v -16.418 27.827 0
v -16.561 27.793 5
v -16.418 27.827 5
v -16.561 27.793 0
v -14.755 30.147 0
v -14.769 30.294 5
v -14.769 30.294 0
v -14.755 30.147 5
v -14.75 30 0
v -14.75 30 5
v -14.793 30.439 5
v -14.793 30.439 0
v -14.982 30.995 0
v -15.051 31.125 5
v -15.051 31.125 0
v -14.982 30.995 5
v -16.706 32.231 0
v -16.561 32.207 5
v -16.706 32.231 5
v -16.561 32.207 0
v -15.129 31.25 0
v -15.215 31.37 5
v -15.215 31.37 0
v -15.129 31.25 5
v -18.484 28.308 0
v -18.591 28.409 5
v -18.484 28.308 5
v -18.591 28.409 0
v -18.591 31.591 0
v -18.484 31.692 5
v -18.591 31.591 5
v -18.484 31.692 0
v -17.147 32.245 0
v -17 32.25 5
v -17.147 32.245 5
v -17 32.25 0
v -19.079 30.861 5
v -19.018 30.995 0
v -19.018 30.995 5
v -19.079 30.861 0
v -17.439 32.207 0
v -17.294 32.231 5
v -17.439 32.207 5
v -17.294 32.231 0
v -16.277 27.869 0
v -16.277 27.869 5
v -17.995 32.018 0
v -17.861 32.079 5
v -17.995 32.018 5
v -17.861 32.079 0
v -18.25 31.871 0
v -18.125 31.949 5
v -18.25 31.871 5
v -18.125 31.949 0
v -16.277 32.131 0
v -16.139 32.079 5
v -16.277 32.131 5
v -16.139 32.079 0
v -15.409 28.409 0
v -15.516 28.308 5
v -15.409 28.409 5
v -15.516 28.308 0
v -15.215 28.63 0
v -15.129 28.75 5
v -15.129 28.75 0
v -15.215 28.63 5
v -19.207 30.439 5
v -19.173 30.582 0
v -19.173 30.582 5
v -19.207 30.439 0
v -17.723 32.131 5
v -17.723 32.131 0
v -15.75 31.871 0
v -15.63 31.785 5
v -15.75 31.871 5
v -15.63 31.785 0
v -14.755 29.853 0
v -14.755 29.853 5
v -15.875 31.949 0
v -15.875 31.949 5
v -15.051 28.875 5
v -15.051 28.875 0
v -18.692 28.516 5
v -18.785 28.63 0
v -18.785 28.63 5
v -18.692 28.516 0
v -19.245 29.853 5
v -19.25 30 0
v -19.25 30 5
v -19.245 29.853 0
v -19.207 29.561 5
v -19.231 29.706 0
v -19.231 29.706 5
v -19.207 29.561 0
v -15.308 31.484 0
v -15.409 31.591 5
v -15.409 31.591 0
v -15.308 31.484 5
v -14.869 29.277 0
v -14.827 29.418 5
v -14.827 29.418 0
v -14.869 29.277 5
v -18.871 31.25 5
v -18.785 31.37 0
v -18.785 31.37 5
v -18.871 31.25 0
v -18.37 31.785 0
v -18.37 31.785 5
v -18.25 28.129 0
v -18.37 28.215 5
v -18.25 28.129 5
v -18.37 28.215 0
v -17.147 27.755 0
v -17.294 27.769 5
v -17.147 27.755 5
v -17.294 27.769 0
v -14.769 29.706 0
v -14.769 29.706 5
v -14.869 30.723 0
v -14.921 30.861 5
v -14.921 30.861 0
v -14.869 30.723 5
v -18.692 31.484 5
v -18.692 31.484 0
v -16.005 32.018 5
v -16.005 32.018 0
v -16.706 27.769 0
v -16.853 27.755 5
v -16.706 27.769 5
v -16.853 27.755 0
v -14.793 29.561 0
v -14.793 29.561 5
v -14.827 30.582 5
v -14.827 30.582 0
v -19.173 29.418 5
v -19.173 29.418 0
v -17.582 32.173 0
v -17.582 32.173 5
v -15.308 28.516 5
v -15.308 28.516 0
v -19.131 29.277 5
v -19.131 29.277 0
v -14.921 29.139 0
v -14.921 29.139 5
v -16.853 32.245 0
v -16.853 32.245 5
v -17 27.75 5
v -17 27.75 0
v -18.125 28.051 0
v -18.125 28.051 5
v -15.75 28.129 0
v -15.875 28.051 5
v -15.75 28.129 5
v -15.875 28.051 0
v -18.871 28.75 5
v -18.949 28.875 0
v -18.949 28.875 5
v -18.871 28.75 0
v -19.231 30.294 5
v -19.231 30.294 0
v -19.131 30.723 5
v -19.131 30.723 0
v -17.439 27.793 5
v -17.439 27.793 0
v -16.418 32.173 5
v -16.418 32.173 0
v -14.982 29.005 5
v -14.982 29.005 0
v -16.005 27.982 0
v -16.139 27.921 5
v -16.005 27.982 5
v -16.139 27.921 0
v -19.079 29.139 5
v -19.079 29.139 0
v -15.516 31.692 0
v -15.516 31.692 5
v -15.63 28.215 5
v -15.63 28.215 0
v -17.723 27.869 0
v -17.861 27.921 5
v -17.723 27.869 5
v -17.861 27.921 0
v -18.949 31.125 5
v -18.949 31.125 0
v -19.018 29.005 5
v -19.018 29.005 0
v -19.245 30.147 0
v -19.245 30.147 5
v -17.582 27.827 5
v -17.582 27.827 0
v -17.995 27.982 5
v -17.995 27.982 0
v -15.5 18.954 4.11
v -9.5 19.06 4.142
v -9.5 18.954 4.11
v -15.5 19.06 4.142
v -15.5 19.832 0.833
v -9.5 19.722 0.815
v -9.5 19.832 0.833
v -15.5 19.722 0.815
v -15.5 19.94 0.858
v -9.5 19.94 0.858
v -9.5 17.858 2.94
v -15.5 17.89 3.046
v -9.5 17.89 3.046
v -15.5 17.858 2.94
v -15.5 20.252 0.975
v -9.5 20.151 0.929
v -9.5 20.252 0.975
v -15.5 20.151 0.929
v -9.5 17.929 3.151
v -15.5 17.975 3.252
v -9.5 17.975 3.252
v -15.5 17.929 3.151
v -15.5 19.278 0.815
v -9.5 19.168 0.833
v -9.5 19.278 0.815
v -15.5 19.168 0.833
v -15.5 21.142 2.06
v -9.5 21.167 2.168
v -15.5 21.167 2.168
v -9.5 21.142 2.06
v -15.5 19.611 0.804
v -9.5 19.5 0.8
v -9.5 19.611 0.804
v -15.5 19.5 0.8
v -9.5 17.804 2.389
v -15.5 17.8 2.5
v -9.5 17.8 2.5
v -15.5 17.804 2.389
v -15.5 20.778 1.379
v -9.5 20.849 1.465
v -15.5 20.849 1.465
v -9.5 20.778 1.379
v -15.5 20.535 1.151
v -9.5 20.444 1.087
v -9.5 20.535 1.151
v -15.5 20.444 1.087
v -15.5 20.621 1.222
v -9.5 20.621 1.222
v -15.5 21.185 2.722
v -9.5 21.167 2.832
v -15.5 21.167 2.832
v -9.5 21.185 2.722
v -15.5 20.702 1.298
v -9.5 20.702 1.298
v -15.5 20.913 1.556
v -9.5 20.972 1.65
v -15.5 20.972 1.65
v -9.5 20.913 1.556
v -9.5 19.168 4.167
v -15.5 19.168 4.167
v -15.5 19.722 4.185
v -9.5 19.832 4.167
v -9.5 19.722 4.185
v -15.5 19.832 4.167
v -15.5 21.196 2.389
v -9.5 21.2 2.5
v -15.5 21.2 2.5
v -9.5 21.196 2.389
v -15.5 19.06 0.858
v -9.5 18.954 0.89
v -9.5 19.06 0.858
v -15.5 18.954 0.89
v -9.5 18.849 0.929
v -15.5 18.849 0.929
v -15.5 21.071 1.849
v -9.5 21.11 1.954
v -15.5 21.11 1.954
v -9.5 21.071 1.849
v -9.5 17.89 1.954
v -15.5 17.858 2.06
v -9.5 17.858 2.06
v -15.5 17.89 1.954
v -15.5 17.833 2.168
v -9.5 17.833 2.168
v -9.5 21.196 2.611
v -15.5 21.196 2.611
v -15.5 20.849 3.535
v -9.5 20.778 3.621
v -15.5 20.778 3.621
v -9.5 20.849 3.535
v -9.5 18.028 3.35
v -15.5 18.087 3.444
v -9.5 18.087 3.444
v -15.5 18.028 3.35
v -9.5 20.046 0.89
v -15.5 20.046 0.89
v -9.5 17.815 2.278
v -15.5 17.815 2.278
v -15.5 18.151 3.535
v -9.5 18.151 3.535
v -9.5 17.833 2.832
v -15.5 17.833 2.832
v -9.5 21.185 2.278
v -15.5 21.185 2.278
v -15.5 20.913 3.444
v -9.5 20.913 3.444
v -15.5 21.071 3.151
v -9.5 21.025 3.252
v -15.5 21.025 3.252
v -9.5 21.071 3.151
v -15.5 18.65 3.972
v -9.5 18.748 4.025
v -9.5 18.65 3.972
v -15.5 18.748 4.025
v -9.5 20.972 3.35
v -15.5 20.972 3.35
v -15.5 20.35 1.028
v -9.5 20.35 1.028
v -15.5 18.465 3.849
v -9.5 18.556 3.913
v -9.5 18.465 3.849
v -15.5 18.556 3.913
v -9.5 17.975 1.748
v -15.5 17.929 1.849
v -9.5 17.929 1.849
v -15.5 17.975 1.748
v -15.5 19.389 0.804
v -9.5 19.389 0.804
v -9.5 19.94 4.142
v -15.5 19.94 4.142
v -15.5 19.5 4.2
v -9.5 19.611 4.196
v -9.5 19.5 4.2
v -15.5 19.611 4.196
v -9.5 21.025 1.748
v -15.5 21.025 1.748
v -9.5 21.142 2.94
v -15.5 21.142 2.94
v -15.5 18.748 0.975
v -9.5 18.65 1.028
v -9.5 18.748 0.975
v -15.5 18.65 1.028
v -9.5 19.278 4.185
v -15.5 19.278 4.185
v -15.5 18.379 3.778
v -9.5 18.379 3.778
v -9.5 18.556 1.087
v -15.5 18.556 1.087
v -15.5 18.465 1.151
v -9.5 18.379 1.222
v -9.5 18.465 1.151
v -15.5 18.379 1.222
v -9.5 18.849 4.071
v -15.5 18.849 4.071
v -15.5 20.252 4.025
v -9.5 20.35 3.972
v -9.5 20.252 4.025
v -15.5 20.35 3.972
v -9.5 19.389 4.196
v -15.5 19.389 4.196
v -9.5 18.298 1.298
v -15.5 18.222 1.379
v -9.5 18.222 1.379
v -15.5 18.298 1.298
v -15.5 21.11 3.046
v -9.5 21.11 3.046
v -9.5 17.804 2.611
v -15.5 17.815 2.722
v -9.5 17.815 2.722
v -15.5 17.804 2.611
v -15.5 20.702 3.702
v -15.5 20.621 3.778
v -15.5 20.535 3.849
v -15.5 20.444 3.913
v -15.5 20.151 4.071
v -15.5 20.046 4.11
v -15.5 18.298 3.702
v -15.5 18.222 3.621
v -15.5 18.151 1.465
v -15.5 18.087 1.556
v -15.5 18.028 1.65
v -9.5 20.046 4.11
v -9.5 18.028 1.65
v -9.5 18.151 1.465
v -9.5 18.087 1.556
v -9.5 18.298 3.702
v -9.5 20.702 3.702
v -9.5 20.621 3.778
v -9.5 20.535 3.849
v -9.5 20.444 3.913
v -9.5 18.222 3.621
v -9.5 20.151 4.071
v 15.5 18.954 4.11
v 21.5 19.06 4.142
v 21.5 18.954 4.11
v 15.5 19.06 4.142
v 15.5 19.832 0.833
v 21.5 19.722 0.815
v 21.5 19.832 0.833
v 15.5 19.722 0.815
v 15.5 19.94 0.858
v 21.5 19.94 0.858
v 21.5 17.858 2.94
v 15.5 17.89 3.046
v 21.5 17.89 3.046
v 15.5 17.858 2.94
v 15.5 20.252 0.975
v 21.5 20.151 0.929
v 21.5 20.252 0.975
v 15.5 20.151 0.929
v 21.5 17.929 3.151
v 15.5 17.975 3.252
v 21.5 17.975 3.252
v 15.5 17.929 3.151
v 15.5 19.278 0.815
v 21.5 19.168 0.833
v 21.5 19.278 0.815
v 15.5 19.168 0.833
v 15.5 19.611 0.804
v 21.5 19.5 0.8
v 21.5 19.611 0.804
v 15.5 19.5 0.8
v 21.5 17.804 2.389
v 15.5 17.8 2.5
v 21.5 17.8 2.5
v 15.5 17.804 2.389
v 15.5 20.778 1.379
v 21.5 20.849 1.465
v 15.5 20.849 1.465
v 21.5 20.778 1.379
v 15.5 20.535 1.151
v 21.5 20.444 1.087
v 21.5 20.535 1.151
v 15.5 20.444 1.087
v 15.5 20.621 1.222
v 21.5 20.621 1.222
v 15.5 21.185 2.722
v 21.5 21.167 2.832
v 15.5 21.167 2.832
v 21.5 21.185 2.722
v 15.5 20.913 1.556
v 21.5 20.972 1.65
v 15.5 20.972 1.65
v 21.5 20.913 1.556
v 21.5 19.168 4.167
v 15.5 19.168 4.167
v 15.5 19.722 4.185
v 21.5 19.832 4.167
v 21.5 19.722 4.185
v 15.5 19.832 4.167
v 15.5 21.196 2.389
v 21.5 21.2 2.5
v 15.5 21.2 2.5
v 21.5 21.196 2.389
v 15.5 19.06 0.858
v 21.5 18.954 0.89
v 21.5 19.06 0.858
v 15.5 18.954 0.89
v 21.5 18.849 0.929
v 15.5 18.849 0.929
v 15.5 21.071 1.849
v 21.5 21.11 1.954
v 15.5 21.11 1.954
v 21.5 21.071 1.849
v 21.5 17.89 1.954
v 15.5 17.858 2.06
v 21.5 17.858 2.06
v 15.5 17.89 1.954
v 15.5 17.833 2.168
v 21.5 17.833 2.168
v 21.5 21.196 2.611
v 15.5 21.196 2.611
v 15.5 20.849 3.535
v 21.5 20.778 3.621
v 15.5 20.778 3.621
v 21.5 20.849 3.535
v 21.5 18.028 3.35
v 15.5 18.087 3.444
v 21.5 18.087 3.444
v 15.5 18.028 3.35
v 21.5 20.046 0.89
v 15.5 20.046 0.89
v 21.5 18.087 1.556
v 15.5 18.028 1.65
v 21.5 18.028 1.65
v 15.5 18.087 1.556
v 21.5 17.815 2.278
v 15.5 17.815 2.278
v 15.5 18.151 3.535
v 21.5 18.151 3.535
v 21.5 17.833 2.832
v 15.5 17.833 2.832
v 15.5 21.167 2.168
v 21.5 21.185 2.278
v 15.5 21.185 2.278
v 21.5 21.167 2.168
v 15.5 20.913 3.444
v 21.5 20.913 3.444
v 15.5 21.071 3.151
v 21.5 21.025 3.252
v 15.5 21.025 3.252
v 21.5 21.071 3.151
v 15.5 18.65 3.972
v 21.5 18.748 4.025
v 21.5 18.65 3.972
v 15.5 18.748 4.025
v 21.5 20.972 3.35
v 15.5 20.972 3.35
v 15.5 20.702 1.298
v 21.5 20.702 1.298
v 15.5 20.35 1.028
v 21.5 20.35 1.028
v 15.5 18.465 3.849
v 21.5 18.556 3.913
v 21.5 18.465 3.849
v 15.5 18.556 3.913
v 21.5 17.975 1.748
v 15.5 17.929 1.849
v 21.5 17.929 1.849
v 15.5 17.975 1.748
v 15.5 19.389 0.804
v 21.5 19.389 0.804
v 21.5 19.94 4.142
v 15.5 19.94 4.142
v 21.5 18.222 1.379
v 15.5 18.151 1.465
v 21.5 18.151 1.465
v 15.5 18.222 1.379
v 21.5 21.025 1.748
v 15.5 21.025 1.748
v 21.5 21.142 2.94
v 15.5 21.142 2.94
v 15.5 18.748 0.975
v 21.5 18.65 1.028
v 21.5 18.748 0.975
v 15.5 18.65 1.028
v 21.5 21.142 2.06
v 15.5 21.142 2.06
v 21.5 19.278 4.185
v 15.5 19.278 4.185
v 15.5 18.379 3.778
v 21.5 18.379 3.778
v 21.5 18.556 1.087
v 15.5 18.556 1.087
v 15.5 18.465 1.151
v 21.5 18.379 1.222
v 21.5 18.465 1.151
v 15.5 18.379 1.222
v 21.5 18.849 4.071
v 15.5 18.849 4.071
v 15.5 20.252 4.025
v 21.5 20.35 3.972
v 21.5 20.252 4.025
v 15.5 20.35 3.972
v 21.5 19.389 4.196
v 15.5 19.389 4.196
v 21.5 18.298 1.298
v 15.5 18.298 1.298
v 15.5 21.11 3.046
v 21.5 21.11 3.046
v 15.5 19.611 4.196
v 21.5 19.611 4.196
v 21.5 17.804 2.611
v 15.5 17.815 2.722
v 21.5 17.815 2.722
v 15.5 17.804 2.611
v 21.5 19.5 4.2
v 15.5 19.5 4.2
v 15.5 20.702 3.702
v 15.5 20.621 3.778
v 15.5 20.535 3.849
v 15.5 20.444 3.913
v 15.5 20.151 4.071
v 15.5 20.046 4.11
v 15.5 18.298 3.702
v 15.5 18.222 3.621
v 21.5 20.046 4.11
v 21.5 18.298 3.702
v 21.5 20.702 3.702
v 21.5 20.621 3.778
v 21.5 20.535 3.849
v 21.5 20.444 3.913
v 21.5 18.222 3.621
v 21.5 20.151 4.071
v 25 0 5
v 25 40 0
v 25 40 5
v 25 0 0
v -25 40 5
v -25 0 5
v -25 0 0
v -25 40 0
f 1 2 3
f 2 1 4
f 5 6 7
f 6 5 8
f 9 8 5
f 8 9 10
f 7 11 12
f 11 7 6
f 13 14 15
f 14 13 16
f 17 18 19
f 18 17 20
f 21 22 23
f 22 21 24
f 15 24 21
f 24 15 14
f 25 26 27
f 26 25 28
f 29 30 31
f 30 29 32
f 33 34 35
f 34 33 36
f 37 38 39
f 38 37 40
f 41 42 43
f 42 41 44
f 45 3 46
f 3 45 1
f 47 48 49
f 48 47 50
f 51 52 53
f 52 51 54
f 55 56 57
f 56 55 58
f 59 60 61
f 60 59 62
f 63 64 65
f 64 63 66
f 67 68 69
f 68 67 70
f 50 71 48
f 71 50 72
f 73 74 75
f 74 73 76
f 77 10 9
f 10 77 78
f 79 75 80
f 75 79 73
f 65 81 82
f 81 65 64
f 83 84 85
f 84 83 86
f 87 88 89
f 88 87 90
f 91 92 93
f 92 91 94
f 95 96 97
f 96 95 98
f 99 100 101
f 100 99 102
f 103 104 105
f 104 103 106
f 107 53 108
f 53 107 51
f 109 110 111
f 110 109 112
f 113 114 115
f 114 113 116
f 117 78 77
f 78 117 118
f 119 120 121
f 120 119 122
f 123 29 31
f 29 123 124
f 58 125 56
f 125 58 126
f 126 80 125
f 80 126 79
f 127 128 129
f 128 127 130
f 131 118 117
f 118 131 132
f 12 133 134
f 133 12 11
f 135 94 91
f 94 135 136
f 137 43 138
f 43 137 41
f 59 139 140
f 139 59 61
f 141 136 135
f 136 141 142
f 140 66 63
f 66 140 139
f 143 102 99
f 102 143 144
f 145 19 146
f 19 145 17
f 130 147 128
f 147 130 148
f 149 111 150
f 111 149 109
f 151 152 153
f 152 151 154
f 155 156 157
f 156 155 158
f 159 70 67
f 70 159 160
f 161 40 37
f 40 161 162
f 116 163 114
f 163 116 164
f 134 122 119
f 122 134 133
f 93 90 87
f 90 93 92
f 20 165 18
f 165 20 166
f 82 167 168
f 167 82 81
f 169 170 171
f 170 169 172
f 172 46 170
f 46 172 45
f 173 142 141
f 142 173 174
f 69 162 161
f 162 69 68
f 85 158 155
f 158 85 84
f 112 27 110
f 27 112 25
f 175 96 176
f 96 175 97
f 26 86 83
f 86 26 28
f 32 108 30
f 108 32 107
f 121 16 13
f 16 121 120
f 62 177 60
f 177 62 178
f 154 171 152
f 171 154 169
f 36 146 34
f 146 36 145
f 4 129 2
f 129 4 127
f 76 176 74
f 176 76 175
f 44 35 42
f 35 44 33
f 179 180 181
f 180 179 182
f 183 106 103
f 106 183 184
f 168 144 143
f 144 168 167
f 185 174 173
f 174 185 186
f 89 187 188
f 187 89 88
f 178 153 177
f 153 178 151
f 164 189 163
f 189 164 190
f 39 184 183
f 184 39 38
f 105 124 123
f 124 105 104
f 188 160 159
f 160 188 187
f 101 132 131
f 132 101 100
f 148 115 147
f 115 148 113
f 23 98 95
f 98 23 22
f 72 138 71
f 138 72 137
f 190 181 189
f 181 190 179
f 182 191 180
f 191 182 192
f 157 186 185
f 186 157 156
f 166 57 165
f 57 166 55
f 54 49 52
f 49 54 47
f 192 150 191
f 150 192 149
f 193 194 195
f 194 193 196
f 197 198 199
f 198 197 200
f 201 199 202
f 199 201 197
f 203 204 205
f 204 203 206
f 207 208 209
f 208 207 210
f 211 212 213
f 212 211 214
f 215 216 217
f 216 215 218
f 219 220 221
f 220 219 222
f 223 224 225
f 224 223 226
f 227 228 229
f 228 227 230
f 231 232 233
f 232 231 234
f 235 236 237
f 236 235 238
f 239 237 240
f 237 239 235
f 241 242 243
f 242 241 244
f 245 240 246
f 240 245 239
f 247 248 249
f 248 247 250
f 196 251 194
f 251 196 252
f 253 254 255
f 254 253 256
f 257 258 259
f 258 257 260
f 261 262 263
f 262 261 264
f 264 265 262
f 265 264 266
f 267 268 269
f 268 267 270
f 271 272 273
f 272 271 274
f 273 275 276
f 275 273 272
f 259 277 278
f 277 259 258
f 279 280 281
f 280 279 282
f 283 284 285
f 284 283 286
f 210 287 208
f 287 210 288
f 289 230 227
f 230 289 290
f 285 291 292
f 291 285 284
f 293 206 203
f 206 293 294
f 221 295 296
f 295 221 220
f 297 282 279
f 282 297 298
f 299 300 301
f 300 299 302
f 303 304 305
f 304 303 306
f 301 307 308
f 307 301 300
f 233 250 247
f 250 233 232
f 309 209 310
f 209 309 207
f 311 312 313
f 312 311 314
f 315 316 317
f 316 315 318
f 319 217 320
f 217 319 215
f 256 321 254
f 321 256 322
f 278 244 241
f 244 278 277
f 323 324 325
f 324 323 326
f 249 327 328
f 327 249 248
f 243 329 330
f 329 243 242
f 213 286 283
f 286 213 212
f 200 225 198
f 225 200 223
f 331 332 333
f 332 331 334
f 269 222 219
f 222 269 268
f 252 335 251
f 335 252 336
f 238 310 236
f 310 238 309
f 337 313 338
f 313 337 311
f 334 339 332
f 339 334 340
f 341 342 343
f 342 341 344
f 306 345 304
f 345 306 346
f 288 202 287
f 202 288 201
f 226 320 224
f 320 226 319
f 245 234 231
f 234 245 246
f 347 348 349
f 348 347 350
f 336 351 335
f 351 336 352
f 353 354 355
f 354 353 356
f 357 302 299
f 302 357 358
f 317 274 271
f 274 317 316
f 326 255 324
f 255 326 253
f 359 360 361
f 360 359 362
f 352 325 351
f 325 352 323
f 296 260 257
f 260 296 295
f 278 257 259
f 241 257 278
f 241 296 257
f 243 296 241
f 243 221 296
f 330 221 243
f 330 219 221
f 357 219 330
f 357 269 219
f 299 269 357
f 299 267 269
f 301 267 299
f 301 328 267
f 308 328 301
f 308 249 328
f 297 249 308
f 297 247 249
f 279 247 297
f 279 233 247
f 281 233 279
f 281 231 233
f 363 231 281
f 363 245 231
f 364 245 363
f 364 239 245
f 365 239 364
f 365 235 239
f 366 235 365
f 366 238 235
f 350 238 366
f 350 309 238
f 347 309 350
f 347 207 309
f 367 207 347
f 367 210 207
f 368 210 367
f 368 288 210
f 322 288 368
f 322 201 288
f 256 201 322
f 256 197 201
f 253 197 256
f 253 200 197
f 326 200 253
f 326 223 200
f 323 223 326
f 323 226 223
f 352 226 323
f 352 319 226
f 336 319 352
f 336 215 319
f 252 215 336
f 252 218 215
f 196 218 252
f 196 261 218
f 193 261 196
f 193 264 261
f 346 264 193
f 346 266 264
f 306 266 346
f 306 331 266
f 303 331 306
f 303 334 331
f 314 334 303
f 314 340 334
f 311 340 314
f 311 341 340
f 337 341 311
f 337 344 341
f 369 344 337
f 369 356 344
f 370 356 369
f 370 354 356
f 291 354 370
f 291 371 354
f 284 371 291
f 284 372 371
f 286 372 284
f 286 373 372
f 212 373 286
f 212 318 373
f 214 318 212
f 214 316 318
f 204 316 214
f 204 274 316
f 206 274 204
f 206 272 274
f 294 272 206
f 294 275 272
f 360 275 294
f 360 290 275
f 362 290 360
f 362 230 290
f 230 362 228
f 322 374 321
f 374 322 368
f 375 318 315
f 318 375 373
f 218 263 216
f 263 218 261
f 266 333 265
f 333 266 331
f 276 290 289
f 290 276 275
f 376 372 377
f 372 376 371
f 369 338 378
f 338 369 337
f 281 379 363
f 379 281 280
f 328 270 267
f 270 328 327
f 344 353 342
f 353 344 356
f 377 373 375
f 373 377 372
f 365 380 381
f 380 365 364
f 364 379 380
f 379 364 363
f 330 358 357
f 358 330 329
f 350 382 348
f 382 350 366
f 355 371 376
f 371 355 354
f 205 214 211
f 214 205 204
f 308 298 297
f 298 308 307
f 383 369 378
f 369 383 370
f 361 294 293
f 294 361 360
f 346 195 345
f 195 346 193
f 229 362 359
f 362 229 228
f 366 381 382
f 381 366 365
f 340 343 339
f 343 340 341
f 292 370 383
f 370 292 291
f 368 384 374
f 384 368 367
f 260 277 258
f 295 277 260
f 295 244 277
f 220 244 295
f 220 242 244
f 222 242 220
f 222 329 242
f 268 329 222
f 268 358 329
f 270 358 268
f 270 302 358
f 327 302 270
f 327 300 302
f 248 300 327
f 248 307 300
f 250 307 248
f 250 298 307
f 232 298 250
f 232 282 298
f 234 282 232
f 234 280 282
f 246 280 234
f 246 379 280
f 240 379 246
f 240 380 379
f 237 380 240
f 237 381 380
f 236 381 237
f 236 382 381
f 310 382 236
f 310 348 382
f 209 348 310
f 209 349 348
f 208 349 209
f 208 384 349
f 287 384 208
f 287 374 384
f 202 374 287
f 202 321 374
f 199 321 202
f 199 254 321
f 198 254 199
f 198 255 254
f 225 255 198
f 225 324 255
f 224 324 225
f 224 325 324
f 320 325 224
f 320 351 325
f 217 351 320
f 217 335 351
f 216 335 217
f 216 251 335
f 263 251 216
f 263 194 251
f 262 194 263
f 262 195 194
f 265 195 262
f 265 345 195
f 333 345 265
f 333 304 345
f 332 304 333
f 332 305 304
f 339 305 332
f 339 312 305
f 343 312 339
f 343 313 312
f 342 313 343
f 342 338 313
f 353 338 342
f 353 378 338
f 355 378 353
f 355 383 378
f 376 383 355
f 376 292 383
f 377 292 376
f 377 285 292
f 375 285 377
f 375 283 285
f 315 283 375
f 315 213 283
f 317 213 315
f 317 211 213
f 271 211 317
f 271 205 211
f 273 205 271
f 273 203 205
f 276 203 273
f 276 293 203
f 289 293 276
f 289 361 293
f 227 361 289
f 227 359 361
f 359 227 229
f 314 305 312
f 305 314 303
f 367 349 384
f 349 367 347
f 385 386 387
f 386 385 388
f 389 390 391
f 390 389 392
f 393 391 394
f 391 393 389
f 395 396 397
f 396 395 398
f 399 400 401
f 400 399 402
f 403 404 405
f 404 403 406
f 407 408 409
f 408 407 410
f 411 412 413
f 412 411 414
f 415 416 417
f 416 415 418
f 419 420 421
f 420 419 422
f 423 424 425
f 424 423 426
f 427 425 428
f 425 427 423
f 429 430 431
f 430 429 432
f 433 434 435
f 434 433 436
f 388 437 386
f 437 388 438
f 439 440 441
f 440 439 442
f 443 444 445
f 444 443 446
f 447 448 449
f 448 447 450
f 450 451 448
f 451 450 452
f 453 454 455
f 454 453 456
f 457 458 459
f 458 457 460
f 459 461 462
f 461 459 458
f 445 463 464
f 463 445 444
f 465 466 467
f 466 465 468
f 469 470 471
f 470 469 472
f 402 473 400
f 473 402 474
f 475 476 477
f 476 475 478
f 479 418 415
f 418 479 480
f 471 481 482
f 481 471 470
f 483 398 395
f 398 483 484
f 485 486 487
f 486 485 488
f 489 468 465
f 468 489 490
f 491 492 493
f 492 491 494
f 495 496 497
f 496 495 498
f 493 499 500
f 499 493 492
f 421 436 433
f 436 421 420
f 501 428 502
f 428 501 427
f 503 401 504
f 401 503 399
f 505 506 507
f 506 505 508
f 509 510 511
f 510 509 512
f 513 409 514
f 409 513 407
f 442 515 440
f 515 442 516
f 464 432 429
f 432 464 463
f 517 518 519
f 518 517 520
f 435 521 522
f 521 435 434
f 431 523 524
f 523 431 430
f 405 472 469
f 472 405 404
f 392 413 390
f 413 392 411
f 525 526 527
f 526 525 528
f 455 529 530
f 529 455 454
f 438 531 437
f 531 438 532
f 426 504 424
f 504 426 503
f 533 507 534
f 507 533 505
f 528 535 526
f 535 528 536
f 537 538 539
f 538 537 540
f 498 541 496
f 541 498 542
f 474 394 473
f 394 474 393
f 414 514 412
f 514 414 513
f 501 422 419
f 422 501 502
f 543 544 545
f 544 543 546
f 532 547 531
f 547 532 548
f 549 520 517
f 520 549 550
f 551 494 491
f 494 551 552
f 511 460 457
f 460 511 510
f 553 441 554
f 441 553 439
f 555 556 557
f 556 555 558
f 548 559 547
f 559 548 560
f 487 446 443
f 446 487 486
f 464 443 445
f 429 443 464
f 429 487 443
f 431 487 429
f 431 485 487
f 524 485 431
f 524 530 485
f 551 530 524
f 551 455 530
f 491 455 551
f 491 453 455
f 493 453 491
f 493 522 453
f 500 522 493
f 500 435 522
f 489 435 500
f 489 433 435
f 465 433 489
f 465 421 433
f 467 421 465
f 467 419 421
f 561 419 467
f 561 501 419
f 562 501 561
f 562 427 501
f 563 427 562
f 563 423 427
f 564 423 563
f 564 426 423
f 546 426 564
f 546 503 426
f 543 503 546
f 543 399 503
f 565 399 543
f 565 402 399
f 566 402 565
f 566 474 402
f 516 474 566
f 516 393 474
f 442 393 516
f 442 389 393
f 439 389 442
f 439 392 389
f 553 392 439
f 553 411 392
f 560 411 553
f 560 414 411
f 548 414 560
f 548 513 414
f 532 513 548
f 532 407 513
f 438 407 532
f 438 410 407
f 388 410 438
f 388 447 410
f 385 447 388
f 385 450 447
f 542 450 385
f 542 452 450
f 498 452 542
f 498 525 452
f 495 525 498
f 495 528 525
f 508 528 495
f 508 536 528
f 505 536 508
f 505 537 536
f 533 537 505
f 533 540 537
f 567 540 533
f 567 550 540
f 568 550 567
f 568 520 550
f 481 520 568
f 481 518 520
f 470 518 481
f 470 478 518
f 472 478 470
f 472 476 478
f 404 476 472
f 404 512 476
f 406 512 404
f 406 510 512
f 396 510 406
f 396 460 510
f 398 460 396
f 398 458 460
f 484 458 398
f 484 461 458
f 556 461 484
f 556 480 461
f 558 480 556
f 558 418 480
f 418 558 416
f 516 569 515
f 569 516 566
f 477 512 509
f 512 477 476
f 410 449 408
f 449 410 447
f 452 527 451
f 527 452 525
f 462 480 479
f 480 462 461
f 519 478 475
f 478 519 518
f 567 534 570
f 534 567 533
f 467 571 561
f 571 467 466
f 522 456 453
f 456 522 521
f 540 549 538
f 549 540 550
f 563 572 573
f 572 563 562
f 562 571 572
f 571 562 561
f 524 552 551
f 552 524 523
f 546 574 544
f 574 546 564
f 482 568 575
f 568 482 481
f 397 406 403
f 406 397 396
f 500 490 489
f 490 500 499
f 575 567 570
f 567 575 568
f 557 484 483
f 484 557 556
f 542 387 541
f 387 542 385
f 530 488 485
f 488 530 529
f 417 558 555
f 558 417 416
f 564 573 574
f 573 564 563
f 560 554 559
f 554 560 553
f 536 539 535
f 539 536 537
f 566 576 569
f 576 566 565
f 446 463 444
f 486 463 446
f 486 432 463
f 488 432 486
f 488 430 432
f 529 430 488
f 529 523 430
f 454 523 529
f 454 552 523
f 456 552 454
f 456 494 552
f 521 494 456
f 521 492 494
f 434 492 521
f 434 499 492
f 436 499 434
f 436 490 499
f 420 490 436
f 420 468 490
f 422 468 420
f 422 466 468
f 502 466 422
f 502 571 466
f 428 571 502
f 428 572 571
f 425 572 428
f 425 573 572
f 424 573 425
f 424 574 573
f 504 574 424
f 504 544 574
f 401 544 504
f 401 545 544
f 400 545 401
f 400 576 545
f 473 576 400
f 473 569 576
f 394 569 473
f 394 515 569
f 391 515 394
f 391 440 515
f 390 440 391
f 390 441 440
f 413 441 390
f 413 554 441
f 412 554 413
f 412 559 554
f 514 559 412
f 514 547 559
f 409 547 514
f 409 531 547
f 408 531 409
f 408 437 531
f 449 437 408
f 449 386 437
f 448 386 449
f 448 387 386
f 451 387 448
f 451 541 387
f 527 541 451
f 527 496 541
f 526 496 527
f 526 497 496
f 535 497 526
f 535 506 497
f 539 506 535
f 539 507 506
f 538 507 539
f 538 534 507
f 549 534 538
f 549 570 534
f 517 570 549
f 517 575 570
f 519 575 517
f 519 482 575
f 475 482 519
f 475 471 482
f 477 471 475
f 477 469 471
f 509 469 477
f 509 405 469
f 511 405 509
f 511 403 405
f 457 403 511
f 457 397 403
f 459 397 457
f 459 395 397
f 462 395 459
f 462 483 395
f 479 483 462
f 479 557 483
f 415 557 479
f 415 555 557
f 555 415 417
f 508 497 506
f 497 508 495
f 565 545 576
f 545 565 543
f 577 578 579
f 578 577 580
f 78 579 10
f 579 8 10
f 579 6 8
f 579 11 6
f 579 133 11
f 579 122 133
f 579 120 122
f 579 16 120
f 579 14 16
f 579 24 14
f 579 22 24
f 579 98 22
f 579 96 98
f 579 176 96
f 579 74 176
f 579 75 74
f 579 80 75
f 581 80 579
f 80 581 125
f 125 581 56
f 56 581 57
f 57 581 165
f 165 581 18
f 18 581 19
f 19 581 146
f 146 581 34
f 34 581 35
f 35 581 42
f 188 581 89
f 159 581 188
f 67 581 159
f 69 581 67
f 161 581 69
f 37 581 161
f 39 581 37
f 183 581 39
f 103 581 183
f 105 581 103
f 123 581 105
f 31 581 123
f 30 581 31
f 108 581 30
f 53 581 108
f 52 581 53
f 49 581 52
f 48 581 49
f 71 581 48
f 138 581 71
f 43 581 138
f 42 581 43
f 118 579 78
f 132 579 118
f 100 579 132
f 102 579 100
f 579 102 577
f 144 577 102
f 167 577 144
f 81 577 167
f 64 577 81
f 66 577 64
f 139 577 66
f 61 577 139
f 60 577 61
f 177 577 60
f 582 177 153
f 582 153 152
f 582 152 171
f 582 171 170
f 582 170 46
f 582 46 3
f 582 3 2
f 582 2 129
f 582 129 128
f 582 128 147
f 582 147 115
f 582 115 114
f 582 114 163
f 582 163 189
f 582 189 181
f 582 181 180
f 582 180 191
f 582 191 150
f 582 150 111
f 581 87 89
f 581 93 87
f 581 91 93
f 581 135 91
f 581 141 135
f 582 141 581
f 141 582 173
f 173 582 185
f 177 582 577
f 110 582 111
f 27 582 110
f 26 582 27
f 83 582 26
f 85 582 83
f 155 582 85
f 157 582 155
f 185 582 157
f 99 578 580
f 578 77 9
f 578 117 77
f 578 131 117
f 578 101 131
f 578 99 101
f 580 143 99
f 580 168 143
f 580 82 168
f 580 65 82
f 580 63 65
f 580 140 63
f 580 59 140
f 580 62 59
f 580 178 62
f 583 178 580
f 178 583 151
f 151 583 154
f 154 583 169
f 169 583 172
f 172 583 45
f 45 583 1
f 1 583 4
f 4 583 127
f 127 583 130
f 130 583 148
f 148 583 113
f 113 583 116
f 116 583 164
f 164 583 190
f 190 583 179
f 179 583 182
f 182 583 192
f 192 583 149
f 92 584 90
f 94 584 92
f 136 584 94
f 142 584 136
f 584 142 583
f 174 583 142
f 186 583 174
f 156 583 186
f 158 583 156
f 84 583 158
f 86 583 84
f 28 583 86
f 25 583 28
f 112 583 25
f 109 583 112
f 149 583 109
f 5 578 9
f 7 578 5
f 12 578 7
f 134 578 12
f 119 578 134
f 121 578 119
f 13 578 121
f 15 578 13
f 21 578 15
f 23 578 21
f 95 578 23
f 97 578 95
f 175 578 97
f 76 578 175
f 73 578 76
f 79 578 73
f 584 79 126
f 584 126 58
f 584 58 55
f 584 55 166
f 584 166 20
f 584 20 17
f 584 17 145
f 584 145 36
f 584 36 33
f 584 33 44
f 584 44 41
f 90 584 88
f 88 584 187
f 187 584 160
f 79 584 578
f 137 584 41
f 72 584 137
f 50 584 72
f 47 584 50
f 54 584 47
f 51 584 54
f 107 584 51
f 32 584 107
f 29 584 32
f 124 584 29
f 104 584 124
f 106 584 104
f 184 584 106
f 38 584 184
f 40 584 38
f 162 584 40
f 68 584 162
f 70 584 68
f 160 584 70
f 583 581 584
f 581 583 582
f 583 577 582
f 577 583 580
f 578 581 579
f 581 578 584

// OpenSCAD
// L-shaped mounting bracket for a NEMA 17 stepper motor (e.g., syringe pump)
// Print orientation: base plate on the bed, motor plate builds upward (+Z)

// ---------------- Parameters (mm) ----------------
base_x      = 25;    // base plate half-width (X)
base_y      = 45;    // base plate length (Y)
base_t      = 5;     // base plate thickness (Z)

motor_x     = 25;    // motor plate half-width (X)
motor_y     = 5;     // motor plate thickness (Y)
motor_h     = 50;    // motor plate height (Z)

boss_d      = 23;    // motor centring boss hole diameter
boss_x      = 0;     // boss hole centre X
boss_z      = 28;    // boss hole centre Z

screw_d     = 3.4;   // M3 screw holes diameter
screw_p     = 31;    // square pattern side length
screw_n     = 4;     // number of screw holes

gusset_t    = 5;     // triangular gusset thickness (X)
gusset_y    = 20;    // gusset leg along +Y
gusset_z    = 20;    // gusset leg along +Z

eps         = 0.5;   // cutter overshoot past faces

$fn = 96;            // curve resolution

// ---------------- Model ----------------
difference() {
    // Base plate
    translate([-base_x, 0, 0])
        cube([base_x * 2, base_y, base_t]);

    // Motor plate (standing on the back edge of the base)
    translate([-motor_x, base_y - motor_y, 0])
        cube([motor_x * 2, motor_y, motor_h]);

    // Triangular gussets, flush with the left and right edges
    for (sx = [-1, 1])
        translate([sx * (motor_x - gusset_t), base_y - motor_y, 0])
            rotate([90, 0, 0])
                linear_extrude(height = gusset_t)
                    polygon(points = [
                        [gusset_t, gusset_y],
                        [gusset_t, gusset_z],
                        [motor_x,  gusset_y]
                    ]);

    // Base plate through-holes (M4)
    for (h = [-1, 1])
        translate([-17, 30, -eps * h])
            cylinder(d = 4.5, h = base_t + 2 * eps * h);

    // Motor boss hole (along Y)
    translate([boss_x, base_y / 2 - eps, boss_z])
        rotate([0, 90, 0])
            cylinder(d = boss_d, h = motor_y + 2 * eps);

    // M3 screw holes on a square pattern, centred on the boss hole
    for (i = [0 : screw_n - 1]) {
        a = (i - (screw_n - 1) / 2) * screw_p;
        translate([a, base_y / 2 - motor_y / 2 - eps,
                   boss_z - (motor_h / 2 + eps)])
            rotate([0, 90, 0])
                cylinder(d = screw_d, h = motor_y + 2 * eps);
    }
}
